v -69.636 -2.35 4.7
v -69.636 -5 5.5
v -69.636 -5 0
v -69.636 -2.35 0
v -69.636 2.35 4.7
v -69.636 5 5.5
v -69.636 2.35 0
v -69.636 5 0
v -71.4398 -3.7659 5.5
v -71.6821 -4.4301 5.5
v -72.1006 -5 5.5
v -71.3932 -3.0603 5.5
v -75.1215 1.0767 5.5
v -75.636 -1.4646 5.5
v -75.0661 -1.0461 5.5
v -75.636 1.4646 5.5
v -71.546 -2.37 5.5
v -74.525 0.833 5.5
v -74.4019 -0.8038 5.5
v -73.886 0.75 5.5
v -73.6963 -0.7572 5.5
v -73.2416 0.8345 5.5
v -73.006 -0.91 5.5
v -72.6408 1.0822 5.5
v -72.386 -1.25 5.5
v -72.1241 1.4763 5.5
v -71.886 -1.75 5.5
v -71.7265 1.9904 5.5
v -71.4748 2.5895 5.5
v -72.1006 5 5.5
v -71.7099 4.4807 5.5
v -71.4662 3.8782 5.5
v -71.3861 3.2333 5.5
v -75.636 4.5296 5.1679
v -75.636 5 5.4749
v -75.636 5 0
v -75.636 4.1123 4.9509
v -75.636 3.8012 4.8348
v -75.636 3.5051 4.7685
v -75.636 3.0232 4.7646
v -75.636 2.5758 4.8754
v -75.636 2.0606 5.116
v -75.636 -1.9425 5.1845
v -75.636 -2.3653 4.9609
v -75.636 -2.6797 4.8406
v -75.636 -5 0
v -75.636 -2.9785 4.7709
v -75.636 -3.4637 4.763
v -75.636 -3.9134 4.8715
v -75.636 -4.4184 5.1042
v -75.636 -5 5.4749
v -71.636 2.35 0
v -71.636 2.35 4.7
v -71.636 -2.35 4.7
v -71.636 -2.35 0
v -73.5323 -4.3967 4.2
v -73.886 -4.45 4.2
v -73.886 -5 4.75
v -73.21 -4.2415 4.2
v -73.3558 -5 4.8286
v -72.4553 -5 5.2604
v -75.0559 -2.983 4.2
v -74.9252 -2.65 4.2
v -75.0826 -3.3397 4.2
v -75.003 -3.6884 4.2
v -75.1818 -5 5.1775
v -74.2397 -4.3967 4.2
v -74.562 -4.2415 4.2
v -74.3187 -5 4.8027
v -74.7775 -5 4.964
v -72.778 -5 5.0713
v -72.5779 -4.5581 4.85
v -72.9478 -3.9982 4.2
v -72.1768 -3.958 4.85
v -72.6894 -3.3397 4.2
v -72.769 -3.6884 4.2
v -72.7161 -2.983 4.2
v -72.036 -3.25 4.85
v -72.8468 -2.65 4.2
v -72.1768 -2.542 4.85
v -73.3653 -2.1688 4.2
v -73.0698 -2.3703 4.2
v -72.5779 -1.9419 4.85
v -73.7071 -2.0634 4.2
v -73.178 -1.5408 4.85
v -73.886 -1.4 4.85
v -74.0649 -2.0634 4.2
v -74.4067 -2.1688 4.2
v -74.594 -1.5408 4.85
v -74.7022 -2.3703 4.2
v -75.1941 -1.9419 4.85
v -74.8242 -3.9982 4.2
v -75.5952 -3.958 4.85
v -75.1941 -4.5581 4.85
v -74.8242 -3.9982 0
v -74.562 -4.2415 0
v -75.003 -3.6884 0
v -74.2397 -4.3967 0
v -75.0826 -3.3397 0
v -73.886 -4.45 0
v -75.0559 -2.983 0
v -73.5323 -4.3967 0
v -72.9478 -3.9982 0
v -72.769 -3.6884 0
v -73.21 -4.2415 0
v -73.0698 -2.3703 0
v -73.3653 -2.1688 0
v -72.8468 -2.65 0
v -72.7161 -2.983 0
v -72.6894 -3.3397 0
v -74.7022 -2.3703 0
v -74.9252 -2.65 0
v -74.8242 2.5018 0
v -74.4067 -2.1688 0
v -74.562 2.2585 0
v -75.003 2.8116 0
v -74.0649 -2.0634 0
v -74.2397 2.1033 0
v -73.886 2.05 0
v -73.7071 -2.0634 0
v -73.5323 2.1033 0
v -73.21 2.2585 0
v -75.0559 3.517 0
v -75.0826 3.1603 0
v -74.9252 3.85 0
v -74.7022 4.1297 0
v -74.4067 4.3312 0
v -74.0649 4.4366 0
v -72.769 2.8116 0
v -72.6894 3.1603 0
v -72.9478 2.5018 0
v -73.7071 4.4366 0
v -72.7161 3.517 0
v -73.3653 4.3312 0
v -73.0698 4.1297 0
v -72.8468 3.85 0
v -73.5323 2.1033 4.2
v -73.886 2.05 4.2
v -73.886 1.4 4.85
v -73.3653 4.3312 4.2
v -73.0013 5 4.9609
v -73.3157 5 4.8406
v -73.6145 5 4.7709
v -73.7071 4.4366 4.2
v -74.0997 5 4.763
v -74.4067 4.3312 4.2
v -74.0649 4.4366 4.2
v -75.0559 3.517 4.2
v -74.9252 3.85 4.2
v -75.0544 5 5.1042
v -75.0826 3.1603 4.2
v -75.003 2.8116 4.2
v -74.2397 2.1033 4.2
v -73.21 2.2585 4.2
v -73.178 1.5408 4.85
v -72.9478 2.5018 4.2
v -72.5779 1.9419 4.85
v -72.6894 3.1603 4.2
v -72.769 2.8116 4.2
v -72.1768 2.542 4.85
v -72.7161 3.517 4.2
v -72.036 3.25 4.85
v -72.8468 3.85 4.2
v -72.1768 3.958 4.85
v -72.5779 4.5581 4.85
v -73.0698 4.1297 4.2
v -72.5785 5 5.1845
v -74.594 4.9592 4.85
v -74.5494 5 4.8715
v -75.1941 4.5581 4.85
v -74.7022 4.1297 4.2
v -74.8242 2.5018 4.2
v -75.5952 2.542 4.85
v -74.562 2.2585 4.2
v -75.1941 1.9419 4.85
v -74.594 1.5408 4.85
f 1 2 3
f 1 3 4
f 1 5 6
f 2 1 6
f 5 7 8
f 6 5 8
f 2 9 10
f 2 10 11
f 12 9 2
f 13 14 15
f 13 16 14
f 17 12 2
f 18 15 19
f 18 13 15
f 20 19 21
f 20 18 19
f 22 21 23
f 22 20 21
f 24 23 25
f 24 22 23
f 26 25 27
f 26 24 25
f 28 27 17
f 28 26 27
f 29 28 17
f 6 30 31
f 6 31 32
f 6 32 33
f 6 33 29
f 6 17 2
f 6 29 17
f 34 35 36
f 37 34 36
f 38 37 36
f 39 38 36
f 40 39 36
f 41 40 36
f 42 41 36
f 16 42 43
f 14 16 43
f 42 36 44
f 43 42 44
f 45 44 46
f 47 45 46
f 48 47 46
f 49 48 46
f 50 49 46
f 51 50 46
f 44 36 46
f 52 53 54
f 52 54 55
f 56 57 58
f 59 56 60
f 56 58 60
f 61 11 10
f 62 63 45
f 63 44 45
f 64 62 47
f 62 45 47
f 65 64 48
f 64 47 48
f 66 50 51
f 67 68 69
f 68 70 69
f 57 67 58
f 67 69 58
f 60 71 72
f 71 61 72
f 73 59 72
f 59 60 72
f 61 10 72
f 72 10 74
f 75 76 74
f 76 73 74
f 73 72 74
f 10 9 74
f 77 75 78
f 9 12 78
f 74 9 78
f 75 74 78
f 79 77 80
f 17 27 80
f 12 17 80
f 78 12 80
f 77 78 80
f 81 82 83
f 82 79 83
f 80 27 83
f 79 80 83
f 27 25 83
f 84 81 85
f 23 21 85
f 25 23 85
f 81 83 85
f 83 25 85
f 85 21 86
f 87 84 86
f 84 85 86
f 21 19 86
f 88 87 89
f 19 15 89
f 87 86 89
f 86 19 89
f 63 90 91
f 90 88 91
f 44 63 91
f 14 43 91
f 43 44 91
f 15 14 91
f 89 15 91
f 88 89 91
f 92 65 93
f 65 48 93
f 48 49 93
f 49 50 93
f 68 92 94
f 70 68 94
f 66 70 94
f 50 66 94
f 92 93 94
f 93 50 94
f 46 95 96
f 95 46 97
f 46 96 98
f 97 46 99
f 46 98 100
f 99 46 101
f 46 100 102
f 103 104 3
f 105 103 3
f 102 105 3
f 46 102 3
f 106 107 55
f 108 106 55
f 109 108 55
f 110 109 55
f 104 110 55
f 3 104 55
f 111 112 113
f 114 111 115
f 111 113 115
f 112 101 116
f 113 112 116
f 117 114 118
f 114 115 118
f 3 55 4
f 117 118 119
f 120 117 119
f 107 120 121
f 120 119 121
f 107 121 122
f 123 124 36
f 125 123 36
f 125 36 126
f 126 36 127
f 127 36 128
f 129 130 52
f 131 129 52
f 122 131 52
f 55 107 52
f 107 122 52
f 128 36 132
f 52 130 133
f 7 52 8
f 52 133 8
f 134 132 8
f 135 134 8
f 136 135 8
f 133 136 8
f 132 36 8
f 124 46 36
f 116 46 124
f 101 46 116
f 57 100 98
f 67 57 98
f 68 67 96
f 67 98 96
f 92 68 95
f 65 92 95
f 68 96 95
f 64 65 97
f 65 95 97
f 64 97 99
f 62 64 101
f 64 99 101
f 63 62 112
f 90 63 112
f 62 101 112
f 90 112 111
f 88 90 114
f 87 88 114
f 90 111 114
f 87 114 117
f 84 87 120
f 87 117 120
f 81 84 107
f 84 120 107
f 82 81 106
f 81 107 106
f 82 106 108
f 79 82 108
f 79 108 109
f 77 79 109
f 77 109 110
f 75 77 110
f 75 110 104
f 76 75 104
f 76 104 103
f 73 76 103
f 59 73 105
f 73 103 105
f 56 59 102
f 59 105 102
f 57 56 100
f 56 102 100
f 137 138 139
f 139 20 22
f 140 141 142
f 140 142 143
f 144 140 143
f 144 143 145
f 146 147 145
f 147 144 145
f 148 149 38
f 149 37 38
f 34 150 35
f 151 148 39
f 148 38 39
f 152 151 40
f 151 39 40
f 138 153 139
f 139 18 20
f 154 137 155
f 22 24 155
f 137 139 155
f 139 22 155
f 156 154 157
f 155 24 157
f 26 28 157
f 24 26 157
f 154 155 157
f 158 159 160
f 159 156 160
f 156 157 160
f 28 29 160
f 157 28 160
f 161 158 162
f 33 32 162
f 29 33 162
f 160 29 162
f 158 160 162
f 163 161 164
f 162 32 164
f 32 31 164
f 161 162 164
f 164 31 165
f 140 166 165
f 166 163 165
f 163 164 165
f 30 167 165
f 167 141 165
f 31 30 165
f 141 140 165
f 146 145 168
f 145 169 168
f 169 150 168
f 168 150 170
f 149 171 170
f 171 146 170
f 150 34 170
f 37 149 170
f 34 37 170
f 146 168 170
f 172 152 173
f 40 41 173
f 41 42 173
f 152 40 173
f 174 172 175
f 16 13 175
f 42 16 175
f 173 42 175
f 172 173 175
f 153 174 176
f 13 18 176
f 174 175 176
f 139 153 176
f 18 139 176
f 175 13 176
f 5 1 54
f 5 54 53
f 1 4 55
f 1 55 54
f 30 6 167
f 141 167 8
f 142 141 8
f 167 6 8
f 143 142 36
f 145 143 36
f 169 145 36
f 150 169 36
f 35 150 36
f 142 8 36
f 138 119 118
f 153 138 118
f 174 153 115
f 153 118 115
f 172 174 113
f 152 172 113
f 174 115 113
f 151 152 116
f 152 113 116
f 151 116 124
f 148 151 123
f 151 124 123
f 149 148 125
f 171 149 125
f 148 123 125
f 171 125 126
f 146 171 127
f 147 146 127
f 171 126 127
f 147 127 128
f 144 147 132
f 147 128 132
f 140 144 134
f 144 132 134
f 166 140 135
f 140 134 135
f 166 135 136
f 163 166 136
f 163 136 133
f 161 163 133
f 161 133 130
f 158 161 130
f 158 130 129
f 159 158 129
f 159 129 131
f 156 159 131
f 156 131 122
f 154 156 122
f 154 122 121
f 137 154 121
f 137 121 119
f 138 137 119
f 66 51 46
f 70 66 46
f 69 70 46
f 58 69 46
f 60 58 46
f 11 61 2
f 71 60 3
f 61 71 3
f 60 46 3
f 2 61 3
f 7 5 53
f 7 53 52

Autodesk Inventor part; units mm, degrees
ref_plane "YZ Plane" through (0, 0, 0) normal (1, 0, 0) x (0, 1, 0)
ref_plane "XZ Plane" through (0, 0, 0) normal (0, 1, 0) x (-1, 0, 0)
ref_plane "XY Plane" through (0, 0, 0) normal (0, 0, 1) x (1, 0, 0)
sketch "Skizze1" plane through (0, 0, 0) normal (0, 0, 1) x (1, 0, 0)
  line L0 (-75.636, -5) -> (-69.636, -5)
  line L1 (-69.636, -5) -> (-69.636, 5)
  line L2 (-69.636, 5) -> (-75.636, 5)
  line L3 (-75.636, 5) -> (-75.636, -5)
  line L4 (-72.636, -5) -> (-72.636, 0) construction
  line L5 (-72.636, 0) -> (-72.636, 5) construction
  line L6 (0, 0) -> (-72.636, 0) construction
  line L7 (-65.022, 4) -> (-65.022, -4) construction
  line L8 (-65.022, 4) -> (-65.022, -4) construction
  line L9 (-65.022, 4) -> (-65.022, -4) construction
  point P0 (-63.636, 3)
  dimension "d0" = 6
  dimension "d1" = 10
  dimension "d2" = 6
extrude "Extrusion1" add sketch "Skizze1" along normal blind 5.5
sketch "Skizze2" plane through (-69.636, -5, 0) normal (1, 0, 0) x (0, 0, -1)
  line L0 (0, 2.65) -> (-4.7, 2.65)
  line L1 (-4.7, 2.65) -> (-4.7, 7.35)
  line L2 (-4.7, 7.35) -> (0, 7.35)
  line L3 (0, 7.35) -> (0, 2.65)
  line L4 (0, 5) -> (-4.7, 5)
  line L5 (0, 0) -> (0, 10) projected
  point P0 (0, 5)
  dimension "d5" = 4.7
  dimension "d6" = 4.7
extrude "Extrusion2" cut sketch "Skizze2" against normal blind 2
sketch "Skizze3" plane through (0, 0, 5.5) normal (0, 0, 1) x (1, 0, 0)
  line L0 (-75.636, 5) -> (-75.636, -5) projected
  line L1 (-73.886, -3.25) -> (-75.636, -3.25) construction
  line L2 (-73.886, 3.25) -> (-75.636, 3.25) construction
  line L3 (-73.886, -3.25) -> (-73.886, -5) construction
  line L4 (-73.886, 3.25) -> (-73.886, 5) construction
  line L5 (-75.636, -5) -> (-69.636, -5) construction
  line L6 (-69.636, 5) -> (-75.636, 5) construction
  point P0 (0, 0)
  dimension "d9" = 1.75
hole "Bohrung1" at (-73.886, 3.25, 5.5) at (-73.886, -3.25, 5.5) direction (0, 0, -1) diameter 2.4 end through all countersink diameter 5 countersink angle 90 clearance for "Flachkopfmaschinenschraube" size "M2" standard "ANSI Metrisches M Profil"
properties part number "Federhalter" material "PC/ABS-Kunststoff, 3DDruck, PLA"
